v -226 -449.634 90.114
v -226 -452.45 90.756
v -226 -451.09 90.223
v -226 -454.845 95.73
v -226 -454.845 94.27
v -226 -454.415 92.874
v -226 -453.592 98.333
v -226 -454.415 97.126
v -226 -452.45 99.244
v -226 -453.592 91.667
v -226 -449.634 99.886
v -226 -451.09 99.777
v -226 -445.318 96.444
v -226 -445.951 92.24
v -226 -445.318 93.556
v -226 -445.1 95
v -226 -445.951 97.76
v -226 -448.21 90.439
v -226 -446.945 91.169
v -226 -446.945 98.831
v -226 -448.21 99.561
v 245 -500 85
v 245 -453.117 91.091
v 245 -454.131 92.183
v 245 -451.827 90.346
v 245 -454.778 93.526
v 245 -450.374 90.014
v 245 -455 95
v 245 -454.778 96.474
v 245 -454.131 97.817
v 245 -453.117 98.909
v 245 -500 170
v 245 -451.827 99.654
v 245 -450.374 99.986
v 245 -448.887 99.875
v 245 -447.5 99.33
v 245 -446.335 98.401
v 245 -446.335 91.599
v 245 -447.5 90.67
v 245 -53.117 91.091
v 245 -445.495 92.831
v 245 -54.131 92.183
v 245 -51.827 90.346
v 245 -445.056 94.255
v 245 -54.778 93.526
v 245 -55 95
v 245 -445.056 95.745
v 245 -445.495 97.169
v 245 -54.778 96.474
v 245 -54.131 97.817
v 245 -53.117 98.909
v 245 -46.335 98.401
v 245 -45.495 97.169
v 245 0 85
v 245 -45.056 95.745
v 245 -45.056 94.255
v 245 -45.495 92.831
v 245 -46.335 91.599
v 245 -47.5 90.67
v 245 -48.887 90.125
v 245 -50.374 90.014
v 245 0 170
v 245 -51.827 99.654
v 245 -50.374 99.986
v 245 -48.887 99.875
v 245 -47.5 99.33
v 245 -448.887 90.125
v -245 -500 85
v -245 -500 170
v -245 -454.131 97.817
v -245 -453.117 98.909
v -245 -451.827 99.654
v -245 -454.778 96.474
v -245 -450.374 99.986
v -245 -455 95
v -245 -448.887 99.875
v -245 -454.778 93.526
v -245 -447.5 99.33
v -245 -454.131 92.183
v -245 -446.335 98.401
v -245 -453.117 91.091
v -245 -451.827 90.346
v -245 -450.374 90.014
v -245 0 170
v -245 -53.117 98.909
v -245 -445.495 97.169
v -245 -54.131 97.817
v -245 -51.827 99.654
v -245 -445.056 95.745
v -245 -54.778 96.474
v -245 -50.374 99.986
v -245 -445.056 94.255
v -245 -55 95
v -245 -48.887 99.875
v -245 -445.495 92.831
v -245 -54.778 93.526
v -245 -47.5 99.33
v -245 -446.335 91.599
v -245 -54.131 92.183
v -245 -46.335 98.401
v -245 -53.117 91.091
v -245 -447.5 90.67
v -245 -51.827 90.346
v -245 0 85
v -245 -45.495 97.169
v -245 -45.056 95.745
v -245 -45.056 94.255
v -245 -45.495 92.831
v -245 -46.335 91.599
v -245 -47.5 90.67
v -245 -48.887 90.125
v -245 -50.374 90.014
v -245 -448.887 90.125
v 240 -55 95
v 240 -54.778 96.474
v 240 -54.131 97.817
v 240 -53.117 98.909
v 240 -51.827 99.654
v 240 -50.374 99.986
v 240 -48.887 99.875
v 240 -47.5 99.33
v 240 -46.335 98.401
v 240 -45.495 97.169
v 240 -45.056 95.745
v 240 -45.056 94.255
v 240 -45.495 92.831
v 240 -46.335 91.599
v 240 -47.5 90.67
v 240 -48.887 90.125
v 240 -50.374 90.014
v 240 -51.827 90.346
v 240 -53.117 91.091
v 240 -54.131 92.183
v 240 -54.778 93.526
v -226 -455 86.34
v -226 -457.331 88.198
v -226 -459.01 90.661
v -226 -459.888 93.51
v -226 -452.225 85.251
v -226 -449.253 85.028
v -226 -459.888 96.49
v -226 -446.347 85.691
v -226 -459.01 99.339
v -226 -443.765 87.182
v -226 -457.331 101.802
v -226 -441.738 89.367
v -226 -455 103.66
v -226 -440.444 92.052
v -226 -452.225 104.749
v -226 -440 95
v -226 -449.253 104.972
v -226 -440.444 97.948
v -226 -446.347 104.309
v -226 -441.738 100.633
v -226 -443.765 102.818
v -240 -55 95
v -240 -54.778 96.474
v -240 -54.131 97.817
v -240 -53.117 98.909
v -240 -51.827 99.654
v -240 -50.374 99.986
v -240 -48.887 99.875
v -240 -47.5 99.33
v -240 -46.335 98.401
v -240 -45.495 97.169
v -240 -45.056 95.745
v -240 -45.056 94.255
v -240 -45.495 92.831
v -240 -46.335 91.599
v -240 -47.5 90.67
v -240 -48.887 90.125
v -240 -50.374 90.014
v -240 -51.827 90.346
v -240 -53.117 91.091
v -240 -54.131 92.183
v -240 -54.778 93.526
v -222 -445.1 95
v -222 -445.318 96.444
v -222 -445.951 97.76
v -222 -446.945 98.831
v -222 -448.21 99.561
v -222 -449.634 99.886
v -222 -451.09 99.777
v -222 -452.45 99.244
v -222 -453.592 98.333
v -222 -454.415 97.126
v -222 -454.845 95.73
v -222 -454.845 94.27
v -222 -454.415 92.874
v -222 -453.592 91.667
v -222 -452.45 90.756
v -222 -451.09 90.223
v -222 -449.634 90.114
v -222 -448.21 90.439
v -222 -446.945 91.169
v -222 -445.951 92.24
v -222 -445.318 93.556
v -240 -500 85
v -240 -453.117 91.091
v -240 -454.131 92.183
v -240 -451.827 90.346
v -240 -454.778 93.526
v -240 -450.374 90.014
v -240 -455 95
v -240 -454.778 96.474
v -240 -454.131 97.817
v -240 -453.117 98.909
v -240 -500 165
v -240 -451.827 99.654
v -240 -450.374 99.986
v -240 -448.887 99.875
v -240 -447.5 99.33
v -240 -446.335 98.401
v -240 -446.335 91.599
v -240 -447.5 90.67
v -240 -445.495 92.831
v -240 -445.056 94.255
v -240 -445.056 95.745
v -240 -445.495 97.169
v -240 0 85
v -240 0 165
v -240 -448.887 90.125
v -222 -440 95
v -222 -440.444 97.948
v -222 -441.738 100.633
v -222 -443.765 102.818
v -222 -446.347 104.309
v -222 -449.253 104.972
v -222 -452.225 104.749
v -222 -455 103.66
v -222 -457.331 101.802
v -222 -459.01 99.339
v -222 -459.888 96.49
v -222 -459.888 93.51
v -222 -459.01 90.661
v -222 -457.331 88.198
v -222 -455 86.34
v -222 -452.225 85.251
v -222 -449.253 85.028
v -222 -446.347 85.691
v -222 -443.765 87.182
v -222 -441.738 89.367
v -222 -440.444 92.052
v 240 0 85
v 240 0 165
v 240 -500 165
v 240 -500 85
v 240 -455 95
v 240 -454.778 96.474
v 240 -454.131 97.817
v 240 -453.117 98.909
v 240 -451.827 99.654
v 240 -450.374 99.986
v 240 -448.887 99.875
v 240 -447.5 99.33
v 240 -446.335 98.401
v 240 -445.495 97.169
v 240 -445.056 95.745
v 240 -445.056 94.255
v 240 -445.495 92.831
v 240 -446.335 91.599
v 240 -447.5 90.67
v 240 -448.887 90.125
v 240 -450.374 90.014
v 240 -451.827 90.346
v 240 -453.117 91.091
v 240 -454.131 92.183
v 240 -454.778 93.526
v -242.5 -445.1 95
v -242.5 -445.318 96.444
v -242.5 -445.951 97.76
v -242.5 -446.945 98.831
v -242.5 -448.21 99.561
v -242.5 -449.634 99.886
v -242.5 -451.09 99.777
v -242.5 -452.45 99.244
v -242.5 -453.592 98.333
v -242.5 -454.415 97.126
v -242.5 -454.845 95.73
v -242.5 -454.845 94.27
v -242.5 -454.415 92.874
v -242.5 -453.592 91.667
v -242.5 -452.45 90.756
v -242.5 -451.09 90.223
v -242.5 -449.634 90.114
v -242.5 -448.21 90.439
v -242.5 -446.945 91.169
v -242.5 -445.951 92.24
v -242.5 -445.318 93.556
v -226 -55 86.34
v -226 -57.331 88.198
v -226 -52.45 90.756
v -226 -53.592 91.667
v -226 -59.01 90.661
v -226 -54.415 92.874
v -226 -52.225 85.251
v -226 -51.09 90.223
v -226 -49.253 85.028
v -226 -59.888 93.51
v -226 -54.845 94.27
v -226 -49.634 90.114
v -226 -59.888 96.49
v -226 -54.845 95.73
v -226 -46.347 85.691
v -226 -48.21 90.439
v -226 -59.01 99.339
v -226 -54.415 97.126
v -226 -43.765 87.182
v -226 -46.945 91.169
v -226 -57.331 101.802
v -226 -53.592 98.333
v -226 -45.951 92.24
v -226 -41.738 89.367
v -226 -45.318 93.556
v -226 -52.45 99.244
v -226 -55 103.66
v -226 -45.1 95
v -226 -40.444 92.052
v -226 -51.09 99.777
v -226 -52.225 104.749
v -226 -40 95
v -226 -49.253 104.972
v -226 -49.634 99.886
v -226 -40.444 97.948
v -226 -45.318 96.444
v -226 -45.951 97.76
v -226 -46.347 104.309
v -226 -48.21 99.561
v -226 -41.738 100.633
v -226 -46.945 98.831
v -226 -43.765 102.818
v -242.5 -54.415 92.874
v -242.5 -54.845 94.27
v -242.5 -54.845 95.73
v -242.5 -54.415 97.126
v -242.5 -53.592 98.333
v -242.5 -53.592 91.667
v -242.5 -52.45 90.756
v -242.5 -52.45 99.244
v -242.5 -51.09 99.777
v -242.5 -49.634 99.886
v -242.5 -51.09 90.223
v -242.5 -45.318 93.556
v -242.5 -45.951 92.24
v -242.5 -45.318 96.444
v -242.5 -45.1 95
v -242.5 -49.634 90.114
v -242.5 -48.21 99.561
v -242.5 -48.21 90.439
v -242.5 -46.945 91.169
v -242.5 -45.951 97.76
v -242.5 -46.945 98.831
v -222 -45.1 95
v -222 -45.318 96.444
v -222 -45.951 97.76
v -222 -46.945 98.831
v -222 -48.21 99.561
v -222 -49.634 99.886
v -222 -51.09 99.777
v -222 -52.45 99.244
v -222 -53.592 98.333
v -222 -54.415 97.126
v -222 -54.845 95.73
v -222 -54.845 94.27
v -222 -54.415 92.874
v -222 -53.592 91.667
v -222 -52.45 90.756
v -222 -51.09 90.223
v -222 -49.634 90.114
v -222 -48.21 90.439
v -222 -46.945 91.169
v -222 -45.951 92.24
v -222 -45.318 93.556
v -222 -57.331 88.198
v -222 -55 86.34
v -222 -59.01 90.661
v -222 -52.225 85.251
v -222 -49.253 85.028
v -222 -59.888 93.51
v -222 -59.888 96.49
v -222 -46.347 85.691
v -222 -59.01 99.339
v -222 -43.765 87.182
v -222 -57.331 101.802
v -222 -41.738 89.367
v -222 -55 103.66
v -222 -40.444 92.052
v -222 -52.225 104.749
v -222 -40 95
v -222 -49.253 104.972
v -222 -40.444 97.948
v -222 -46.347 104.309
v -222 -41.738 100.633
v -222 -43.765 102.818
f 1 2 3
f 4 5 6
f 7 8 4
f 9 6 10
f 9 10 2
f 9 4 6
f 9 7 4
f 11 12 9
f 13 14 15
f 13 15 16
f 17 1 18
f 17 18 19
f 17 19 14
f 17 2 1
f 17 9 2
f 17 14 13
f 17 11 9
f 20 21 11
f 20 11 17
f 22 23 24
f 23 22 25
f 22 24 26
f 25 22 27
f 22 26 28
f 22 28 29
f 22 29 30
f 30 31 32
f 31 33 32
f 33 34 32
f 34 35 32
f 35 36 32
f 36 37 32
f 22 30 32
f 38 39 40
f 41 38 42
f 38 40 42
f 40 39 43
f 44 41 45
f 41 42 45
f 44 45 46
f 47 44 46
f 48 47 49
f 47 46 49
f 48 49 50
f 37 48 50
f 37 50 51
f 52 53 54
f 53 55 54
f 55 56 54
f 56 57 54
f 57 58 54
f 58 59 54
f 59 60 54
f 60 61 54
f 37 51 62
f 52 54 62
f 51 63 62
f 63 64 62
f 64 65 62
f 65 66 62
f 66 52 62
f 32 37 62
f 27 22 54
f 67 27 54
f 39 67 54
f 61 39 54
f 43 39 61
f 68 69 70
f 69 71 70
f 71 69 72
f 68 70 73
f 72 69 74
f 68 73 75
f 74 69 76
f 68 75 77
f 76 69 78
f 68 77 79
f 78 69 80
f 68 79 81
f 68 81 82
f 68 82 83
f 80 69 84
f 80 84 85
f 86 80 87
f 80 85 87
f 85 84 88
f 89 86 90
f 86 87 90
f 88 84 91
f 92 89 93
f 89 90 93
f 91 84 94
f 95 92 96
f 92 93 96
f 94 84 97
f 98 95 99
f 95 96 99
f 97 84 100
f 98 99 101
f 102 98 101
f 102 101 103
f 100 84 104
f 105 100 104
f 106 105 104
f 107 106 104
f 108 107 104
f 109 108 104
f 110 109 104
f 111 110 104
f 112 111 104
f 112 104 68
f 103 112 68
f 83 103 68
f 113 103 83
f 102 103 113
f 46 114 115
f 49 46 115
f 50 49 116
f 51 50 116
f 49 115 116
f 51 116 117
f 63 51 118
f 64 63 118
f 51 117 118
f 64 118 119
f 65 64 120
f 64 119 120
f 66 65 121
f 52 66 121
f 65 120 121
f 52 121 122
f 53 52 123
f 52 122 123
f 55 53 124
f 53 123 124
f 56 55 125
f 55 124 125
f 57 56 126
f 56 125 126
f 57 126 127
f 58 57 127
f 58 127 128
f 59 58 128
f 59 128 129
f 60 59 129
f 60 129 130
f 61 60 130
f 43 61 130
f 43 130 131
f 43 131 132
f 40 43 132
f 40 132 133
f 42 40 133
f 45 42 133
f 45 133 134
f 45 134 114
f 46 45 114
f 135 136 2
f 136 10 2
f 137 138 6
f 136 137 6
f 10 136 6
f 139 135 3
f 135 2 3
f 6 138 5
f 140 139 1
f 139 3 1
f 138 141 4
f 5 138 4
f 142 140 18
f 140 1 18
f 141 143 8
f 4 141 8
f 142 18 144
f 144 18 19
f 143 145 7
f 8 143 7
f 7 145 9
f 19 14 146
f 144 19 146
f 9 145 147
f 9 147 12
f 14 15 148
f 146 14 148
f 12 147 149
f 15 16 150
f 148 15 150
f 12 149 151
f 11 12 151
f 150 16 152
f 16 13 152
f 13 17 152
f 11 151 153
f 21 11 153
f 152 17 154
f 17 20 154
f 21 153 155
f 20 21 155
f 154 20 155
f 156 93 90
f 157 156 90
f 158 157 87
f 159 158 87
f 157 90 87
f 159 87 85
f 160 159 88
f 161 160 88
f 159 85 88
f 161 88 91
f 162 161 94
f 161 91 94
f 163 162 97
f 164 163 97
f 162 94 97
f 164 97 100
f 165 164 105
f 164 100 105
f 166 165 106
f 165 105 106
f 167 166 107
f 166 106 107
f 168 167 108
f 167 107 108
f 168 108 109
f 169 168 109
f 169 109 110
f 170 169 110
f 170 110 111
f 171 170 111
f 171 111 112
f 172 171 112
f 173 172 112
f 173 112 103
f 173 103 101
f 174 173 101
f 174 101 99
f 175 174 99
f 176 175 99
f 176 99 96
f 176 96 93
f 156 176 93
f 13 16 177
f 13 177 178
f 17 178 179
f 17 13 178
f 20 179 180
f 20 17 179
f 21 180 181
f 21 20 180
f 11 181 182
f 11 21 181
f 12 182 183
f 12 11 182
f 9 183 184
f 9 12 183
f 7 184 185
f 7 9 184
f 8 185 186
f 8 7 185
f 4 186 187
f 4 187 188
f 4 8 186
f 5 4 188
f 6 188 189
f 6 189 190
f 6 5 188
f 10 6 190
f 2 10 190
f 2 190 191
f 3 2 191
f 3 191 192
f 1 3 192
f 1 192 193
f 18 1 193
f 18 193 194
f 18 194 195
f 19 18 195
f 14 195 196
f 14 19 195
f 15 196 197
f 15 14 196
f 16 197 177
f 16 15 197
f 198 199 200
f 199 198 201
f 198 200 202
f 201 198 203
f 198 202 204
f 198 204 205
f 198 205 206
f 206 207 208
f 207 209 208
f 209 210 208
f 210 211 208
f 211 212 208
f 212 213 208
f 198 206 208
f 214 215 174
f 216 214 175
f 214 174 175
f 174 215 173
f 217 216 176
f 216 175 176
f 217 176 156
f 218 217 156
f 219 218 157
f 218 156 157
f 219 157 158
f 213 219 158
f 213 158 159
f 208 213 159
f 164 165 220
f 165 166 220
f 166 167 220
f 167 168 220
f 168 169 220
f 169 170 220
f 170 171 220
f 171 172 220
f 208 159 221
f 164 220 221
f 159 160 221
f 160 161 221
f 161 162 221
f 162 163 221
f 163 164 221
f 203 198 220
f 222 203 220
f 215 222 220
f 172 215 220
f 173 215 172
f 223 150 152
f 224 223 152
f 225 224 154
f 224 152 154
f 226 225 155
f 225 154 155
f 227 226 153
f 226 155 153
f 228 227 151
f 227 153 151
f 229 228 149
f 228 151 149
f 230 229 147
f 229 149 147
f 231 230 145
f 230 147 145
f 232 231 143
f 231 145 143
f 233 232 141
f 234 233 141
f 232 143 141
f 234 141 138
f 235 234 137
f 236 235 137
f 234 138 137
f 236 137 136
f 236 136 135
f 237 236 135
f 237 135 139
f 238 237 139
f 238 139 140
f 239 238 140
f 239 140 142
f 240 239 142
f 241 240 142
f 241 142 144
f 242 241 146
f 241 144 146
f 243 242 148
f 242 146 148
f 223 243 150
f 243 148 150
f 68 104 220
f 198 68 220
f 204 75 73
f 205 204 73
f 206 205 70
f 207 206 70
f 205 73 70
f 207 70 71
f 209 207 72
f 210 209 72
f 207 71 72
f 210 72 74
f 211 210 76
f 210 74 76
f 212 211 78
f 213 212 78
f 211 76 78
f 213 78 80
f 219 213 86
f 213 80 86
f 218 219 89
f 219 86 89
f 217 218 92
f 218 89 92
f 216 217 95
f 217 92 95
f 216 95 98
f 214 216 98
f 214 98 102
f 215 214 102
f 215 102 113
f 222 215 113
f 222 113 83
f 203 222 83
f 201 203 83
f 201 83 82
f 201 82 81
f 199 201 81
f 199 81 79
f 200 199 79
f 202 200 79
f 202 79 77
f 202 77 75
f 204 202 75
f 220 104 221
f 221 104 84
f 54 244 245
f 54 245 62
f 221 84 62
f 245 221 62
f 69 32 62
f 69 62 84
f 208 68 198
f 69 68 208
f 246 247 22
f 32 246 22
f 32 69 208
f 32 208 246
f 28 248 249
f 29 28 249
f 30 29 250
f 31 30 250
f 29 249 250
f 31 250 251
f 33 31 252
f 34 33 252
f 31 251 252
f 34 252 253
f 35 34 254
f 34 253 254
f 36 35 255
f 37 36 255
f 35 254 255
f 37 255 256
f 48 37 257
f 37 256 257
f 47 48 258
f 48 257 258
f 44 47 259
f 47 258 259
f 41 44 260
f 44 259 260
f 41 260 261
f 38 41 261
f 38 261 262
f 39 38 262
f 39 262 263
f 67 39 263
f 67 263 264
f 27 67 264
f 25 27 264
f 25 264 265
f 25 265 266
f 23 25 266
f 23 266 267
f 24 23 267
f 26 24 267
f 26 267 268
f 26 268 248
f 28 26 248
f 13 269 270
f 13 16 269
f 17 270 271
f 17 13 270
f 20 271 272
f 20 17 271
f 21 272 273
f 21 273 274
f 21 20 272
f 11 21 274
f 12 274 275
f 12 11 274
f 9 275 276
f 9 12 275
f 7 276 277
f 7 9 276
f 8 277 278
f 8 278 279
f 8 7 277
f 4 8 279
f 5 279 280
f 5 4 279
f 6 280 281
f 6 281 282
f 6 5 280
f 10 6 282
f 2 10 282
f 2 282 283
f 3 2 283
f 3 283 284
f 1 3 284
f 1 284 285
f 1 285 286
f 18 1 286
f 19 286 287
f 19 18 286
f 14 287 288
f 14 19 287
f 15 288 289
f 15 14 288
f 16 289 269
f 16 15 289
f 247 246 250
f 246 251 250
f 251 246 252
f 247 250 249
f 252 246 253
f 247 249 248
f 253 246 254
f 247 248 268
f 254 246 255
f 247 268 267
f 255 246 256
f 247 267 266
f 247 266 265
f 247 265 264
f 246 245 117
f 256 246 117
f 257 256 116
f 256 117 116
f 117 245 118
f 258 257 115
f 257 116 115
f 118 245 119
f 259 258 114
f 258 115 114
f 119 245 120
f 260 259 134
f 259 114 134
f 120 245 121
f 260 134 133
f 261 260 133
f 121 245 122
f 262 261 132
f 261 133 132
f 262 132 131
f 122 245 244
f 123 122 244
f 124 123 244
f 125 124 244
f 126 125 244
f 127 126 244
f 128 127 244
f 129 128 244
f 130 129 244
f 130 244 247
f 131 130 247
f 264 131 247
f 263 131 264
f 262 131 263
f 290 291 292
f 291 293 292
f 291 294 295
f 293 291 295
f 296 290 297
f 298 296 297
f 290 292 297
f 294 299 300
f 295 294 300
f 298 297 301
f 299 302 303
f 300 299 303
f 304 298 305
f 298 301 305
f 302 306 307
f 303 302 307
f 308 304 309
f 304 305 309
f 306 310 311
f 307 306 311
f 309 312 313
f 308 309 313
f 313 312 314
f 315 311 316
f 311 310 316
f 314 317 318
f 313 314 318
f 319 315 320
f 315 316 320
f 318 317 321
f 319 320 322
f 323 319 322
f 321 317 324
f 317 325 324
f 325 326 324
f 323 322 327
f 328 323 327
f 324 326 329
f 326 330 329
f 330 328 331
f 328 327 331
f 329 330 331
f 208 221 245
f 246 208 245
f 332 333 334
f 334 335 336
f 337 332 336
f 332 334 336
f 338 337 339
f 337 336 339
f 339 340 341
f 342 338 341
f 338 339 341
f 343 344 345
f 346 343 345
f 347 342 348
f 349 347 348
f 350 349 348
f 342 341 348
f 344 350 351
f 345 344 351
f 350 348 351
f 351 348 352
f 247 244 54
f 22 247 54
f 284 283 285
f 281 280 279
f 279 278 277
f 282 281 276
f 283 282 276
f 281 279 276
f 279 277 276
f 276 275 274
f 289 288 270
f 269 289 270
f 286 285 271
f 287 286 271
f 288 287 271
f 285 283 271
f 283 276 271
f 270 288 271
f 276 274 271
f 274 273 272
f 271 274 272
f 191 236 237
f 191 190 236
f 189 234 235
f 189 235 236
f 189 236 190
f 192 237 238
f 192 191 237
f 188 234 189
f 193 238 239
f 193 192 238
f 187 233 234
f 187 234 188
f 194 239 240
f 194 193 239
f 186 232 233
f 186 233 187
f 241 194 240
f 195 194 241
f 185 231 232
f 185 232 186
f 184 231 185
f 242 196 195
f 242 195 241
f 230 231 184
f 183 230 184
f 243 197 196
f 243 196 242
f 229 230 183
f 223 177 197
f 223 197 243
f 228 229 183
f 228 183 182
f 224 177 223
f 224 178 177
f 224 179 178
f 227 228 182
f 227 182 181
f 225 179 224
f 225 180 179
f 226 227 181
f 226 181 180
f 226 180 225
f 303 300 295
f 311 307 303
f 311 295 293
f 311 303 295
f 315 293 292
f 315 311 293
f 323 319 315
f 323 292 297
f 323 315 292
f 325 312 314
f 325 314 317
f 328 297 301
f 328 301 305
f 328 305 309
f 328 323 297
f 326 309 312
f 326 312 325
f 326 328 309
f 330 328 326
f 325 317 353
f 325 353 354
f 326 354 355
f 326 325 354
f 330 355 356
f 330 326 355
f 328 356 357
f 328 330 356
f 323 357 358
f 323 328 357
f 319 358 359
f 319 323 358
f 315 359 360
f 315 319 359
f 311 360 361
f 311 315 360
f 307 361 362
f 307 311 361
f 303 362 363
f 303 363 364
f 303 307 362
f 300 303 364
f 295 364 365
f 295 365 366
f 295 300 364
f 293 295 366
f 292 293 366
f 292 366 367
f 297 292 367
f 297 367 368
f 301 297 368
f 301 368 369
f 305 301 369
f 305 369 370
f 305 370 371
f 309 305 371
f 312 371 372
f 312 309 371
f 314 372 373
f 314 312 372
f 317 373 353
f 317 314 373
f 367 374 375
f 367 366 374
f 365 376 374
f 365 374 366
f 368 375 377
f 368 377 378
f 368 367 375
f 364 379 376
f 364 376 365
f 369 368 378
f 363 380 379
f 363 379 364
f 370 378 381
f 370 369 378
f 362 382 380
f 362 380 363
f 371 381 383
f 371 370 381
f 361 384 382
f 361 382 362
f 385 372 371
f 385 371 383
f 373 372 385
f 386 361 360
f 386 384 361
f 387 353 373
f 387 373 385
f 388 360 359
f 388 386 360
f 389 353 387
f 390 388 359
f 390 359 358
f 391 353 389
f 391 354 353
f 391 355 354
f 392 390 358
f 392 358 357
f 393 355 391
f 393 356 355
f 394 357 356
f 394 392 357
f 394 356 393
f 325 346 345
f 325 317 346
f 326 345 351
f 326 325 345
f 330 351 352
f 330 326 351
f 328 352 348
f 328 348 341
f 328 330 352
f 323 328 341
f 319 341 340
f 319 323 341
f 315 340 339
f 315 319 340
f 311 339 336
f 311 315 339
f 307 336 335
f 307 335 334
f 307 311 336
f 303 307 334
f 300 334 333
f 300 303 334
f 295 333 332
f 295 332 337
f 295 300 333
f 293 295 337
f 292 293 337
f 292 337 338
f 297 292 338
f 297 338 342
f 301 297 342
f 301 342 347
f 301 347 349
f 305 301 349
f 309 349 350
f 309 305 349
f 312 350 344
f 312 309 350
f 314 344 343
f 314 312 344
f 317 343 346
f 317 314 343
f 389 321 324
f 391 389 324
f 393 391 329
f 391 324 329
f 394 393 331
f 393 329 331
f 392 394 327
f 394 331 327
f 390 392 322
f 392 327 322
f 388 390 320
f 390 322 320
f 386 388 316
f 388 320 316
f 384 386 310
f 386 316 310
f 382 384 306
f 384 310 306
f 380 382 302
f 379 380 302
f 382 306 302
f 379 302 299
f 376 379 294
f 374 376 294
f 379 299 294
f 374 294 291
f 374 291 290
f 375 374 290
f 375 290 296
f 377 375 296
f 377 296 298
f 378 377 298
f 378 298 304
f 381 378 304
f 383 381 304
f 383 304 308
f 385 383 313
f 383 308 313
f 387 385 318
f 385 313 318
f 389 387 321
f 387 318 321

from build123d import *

# Parameters (mm, degrees)
F1_DEPTH      = 500
F2_R          = 5
F3_DEPTH      = 490.001
F4_R          = 4.9
F5_DEPTH      = 14
F5_DEPTH_BACK = 2.5
F6_R          = 10
F6_R_2        = 4.9
F7_DEPTH      = 4
F8_R          = 10
F8_R_2        = 4.9
F9_DEPTH      = 4


with BuildPart() as f1:
    # F0 (on Front) → F1 (new body)
    with BuildSketch(Plane.XZ):
        Polygon((-245, 170), (-245, 85), (-240, 85), (-240, 165), (240, 165), (240, 85), (245, 85), (245, 170), align=None)
    extrude(amount=F1_DEPTH)

    # F2 (on face) → F3 (cut, through all)
    with BuildSketch(Plane(origin=(-245, 0, 0), x_dir=(0, -1, 0), z_dir=(-1, 0, 0))):
        with Locations((50, 95)):
            Circle(F2_R)
        with Locations((450, 95)):
            Circle(F2_R)
    extrude(amount=-F3_DEPTH, mode=Mode.SUBTRACT)


with BuildPart() as f5:
    # F4 (on face) → F5 (new body, two sides)
    with BuildSketch(Plane.YZ.offset(-240)) as f5_sk:
        with Locations((-450, 95)):
            Circle(F4_R)
        with Locations((-50, 95)):
            Circle(F4_R)
    extrude(amount=F5_DEPTH)
    extrude(f5_sk.sketch, amount=-F5_DEPTH_BACK)

    # F6 (on face) → F7 (join)
    with BuildSketch(Plane.YZ.offset(-226)):
        with Locations((-50, 95)):
            Circle(F6_R)
        with Locations((-50, 95)):
            Circle(F6_R_2, mode=Mode.SUBTRACT)
    extrude(amount=F7_DEPTH)

    # F8 (on face) → F9 (join)
    with BuildSketch(Plane.YZ.offset(-226)):
        with Locations((-450, 95)):
            Circle(F8_R)
        with Locations((-450, 95)):
            Circle(F8_R_2, mode=Mode.SUBTRACT)
    extrude(amount=F9_DEPTH)


solid = Compound([f1.part, f5.part])
